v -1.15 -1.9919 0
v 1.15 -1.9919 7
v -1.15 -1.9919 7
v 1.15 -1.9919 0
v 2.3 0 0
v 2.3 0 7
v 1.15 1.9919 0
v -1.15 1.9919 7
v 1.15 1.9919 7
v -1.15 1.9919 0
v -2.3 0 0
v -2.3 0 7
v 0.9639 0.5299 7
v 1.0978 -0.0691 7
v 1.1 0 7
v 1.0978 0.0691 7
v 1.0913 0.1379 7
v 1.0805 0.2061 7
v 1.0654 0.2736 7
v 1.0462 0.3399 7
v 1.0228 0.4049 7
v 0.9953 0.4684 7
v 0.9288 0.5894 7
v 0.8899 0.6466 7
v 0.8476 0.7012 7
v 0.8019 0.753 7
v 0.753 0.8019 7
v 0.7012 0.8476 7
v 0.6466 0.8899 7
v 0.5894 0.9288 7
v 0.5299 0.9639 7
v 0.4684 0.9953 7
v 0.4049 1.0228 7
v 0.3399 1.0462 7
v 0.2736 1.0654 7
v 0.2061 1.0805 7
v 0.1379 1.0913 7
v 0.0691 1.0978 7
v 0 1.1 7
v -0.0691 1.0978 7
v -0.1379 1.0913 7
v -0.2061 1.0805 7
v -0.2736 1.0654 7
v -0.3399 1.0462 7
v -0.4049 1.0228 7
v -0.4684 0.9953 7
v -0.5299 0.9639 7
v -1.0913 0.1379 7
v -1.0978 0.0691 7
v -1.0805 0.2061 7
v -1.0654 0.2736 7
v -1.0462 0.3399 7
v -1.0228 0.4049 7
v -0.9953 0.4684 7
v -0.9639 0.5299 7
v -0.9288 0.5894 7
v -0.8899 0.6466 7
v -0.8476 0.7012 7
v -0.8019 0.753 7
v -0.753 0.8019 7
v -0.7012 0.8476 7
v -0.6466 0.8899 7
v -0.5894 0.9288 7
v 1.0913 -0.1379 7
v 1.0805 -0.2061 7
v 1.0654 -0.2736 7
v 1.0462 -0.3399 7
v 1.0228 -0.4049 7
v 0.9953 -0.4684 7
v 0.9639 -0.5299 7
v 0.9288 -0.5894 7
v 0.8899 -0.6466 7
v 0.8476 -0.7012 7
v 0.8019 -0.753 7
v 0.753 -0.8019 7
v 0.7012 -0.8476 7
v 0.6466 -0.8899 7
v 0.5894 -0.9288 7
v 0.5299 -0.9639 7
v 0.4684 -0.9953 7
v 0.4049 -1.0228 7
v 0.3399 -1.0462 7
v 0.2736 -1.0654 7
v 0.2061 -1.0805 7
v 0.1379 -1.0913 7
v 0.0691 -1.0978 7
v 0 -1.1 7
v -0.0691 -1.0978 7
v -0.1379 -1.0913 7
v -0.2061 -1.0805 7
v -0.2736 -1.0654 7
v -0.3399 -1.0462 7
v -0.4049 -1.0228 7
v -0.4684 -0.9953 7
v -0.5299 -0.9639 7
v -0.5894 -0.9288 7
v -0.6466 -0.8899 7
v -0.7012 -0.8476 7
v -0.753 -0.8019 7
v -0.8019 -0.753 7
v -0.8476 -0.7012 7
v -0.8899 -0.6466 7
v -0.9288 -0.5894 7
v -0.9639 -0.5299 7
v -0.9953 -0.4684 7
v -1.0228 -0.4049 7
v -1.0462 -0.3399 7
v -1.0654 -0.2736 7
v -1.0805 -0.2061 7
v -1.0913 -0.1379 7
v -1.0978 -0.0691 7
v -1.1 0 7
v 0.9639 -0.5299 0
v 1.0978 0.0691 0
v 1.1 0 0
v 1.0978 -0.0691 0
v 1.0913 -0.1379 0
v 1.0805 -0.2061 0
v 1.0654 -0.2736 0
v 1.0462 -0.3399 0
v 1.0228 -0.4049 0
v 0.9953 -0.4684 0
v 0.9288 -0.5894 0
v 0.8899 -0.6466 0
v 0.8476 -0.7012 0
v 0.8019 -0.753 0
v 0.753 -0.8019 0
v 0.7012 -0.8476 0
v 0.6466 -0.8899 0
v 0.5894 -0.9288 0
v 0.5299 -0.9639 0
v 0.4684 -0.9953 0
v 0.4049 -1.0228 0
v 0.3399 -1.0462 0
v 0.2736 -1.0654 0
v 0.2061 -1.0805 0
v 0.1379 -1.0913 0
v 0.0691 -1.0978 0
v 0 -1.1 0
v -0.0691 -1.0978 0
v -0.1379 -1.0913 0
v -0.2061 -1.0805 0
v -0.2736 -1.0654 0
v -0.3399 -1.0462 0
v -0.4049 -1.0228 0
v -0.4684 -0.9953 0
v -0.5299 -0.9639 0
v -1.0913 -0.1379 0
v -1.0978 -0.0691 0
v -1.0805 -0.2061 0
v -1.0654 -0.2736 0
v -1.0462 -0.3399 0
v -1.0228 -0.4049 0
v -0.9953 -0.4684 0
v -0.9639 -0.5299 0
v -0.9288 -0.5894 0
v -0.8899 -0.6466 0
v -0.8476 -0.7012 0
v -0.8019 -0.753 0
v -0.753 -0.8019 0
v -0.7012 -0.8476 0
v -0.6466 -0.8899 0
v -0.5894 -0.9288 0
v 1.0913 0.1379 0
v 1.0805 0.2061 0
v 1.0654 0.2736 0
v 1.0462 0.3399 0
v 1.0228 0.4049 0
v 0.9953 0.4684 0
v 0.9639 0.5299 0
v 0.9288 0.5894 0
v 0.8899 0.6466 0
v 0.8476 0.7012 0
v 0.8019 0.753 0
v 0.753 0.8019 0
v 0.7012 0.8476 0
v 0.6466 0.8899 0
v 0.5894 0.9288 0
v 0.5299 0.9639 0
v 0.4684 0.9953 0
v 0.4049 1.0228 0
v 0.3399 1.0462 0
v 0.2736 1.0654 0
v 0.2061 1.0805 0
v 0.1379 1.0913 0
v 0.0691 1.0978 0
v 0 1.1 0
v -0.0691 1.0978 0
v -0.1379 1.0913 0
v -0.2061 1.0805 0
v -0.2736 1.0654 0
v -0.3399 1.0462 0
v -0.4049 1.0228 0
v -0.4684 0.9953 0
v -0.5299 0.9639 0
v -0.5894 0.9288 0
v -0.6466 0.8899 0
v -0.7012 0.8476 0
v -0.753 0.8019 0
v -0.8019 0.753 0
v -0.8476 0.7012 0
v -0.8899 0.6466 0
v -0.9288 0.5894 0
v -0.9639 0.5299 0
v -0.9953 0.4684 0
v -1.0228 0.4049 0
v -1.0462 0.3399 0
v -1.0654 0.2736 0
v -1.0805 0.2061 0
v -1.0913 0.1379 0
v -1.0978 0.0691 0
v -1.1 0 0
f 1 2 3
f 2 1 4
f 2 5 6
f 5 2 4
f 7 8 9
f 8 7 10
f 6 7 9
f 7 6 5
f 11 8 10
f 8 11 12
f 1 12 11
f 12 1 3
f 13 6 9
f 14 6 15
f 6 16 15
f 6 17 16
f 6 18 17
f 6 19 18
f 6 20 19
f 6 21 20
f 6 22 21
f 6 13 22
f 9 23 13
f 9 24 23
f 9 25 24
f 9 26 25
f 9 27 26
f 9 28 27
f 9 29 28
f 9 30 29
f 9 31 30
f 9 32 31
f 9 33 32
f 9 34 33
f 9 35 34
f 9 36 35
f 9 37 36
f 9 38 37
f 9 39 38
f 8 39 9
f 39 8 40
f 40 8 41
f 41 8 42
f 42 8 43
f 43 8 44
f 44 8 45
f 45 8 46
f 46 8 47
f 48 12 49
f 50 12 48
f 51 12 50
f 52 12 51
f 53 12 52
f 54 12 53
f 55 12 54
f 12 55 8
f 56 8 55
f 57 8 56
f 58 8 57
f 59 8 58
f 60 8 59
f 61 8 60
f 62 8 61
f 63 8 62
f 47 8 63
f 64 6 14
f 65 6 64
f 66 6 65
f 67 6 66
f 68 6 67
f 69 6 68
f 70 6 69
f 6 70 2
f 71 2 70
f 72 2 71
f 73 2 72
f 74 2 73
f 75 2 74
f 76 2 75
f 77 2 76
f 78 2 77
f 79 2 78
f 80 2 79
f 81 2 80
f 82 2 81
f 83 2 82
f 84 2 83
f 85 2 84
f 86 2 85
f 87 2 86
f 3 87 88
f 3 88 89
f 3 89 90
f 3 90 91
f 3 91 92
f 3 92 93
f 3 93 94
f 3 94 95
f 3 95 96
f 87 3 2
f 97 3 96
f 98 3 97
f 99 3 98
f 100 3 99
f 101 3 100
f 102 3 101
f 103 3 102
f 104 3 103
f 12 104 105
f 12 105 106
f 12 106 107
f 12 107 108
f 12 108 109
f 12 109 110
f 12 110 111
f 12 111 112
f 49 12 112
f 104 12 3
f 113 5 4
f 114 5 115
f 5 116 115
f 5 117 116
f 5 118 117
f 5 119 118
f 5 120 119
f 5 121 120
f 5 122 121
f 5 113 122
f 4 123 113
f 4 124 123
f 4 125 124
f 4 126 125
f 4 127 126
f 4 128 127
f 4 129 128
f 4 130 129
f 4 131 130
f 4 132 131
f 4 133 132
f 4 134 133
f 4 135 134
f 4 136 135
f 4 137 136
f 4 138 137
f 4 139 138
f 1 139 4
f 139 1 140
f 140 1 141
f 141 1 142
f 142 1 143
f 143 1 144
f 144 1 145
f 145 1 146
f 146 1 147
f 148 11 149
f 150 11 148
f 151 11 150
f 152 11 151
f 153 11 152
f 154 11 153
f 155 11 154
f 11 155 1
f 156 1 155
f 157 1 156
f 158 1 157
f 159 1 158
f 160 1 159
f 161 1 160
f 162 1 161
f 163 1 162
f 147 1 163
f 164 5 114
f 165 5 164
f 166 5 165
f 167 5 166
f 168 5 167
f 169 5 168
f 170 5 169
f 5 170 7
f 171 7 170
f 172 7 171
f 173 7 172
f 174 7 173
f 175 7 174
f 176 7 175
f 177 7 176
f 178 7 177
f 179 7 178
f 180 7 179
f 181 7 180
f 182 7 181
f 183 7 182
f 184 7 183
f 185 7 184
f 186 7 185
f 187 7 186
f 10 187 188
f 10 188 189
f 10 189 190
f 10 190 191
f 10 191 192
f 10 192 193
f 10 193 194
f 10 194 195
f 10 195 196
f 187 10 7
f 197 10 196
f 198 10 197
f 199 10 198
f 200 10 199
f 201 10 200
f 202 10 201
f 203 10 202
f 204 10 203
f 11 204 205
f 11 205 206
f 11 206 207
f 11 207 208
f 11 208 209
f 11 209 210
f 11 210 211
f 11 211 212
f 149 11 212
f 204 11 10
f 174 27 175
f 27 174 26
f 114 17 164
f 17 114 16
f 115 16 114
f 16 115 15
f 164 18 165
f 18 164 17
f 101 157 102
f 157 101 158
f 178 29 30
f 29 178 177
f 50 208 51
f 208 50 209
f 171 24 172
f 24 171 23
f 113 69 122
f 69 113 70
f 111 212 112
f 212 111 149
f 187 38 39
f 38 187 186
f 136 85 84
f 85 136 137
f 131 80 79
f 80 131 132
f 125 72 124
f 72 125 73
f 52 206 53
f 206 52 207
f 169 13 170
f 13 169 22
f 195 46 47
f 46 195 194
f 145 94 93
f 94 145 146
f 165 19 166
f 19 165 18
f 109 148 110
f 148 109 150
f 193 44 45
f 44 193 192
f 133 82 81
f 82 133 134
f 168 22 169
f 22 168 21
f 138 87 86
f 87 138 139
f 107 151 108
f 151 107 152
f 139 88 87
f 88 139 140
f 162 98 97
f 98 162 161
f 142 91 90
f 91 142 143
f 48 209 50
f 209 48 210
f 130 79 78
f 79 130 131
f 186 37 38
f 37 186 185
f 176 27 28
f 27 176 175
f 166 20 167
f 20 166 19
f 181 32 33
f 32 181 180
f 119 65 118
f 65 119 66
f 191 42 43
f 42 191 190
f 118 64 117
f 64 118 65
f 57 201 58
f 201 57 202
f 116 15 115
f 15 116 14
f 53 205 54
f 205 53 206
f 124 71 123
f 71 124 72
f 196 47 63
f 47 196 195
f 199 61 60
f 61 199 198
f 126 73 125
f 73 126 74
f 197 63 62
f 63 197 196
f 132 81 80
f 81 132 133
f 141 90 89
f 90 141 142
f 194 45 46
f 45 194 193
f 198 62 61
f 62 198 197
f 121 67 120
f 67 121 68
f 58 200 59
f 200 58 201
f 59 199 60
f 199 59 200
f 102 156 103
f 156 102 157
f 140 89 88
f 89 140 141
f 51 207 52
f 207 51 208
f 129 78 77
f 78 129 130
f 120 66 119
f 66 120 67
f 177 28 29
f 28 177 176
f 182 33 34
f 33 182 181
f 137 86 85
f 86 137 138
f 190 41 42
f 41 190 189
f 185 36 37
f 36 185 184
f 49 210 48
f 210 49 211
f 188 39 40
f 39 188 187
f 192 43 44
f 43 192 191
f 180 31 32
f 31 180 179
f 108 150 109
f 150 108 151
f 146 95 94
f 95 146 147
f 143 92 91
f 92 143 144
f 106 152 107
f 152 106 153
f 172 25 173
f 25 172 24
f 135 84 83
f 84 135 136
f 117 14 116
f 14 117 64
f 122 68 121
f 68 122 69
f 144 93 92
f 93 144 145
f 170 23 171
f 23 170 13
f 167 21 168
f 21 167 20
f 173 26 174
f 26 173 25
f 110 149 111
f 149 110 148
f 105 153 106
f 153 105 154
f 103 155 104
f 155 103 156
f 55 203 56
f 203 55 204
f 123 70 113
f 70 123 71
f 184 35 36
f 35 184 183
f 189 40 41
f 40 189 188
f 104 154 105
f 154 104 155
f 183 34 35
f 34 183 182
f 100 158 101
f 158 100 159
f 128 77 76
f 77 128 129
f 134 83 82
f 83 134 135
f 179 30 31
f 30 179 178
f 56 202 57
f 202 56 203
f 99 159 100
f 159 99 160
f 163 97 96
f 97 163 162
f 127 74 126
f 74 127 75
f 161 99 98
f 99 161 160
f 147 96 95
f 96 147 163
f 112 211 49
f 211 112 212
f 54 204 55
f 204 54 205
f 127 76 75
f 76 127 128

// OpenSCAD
difference () {
  union() {
    $fn = 6;
    color([.7, .7, .7]) cylinder(d = 4.6, h = 7);
  }
  $fn = 100;
  cylinder(d = 2.2, h = 7);
}
